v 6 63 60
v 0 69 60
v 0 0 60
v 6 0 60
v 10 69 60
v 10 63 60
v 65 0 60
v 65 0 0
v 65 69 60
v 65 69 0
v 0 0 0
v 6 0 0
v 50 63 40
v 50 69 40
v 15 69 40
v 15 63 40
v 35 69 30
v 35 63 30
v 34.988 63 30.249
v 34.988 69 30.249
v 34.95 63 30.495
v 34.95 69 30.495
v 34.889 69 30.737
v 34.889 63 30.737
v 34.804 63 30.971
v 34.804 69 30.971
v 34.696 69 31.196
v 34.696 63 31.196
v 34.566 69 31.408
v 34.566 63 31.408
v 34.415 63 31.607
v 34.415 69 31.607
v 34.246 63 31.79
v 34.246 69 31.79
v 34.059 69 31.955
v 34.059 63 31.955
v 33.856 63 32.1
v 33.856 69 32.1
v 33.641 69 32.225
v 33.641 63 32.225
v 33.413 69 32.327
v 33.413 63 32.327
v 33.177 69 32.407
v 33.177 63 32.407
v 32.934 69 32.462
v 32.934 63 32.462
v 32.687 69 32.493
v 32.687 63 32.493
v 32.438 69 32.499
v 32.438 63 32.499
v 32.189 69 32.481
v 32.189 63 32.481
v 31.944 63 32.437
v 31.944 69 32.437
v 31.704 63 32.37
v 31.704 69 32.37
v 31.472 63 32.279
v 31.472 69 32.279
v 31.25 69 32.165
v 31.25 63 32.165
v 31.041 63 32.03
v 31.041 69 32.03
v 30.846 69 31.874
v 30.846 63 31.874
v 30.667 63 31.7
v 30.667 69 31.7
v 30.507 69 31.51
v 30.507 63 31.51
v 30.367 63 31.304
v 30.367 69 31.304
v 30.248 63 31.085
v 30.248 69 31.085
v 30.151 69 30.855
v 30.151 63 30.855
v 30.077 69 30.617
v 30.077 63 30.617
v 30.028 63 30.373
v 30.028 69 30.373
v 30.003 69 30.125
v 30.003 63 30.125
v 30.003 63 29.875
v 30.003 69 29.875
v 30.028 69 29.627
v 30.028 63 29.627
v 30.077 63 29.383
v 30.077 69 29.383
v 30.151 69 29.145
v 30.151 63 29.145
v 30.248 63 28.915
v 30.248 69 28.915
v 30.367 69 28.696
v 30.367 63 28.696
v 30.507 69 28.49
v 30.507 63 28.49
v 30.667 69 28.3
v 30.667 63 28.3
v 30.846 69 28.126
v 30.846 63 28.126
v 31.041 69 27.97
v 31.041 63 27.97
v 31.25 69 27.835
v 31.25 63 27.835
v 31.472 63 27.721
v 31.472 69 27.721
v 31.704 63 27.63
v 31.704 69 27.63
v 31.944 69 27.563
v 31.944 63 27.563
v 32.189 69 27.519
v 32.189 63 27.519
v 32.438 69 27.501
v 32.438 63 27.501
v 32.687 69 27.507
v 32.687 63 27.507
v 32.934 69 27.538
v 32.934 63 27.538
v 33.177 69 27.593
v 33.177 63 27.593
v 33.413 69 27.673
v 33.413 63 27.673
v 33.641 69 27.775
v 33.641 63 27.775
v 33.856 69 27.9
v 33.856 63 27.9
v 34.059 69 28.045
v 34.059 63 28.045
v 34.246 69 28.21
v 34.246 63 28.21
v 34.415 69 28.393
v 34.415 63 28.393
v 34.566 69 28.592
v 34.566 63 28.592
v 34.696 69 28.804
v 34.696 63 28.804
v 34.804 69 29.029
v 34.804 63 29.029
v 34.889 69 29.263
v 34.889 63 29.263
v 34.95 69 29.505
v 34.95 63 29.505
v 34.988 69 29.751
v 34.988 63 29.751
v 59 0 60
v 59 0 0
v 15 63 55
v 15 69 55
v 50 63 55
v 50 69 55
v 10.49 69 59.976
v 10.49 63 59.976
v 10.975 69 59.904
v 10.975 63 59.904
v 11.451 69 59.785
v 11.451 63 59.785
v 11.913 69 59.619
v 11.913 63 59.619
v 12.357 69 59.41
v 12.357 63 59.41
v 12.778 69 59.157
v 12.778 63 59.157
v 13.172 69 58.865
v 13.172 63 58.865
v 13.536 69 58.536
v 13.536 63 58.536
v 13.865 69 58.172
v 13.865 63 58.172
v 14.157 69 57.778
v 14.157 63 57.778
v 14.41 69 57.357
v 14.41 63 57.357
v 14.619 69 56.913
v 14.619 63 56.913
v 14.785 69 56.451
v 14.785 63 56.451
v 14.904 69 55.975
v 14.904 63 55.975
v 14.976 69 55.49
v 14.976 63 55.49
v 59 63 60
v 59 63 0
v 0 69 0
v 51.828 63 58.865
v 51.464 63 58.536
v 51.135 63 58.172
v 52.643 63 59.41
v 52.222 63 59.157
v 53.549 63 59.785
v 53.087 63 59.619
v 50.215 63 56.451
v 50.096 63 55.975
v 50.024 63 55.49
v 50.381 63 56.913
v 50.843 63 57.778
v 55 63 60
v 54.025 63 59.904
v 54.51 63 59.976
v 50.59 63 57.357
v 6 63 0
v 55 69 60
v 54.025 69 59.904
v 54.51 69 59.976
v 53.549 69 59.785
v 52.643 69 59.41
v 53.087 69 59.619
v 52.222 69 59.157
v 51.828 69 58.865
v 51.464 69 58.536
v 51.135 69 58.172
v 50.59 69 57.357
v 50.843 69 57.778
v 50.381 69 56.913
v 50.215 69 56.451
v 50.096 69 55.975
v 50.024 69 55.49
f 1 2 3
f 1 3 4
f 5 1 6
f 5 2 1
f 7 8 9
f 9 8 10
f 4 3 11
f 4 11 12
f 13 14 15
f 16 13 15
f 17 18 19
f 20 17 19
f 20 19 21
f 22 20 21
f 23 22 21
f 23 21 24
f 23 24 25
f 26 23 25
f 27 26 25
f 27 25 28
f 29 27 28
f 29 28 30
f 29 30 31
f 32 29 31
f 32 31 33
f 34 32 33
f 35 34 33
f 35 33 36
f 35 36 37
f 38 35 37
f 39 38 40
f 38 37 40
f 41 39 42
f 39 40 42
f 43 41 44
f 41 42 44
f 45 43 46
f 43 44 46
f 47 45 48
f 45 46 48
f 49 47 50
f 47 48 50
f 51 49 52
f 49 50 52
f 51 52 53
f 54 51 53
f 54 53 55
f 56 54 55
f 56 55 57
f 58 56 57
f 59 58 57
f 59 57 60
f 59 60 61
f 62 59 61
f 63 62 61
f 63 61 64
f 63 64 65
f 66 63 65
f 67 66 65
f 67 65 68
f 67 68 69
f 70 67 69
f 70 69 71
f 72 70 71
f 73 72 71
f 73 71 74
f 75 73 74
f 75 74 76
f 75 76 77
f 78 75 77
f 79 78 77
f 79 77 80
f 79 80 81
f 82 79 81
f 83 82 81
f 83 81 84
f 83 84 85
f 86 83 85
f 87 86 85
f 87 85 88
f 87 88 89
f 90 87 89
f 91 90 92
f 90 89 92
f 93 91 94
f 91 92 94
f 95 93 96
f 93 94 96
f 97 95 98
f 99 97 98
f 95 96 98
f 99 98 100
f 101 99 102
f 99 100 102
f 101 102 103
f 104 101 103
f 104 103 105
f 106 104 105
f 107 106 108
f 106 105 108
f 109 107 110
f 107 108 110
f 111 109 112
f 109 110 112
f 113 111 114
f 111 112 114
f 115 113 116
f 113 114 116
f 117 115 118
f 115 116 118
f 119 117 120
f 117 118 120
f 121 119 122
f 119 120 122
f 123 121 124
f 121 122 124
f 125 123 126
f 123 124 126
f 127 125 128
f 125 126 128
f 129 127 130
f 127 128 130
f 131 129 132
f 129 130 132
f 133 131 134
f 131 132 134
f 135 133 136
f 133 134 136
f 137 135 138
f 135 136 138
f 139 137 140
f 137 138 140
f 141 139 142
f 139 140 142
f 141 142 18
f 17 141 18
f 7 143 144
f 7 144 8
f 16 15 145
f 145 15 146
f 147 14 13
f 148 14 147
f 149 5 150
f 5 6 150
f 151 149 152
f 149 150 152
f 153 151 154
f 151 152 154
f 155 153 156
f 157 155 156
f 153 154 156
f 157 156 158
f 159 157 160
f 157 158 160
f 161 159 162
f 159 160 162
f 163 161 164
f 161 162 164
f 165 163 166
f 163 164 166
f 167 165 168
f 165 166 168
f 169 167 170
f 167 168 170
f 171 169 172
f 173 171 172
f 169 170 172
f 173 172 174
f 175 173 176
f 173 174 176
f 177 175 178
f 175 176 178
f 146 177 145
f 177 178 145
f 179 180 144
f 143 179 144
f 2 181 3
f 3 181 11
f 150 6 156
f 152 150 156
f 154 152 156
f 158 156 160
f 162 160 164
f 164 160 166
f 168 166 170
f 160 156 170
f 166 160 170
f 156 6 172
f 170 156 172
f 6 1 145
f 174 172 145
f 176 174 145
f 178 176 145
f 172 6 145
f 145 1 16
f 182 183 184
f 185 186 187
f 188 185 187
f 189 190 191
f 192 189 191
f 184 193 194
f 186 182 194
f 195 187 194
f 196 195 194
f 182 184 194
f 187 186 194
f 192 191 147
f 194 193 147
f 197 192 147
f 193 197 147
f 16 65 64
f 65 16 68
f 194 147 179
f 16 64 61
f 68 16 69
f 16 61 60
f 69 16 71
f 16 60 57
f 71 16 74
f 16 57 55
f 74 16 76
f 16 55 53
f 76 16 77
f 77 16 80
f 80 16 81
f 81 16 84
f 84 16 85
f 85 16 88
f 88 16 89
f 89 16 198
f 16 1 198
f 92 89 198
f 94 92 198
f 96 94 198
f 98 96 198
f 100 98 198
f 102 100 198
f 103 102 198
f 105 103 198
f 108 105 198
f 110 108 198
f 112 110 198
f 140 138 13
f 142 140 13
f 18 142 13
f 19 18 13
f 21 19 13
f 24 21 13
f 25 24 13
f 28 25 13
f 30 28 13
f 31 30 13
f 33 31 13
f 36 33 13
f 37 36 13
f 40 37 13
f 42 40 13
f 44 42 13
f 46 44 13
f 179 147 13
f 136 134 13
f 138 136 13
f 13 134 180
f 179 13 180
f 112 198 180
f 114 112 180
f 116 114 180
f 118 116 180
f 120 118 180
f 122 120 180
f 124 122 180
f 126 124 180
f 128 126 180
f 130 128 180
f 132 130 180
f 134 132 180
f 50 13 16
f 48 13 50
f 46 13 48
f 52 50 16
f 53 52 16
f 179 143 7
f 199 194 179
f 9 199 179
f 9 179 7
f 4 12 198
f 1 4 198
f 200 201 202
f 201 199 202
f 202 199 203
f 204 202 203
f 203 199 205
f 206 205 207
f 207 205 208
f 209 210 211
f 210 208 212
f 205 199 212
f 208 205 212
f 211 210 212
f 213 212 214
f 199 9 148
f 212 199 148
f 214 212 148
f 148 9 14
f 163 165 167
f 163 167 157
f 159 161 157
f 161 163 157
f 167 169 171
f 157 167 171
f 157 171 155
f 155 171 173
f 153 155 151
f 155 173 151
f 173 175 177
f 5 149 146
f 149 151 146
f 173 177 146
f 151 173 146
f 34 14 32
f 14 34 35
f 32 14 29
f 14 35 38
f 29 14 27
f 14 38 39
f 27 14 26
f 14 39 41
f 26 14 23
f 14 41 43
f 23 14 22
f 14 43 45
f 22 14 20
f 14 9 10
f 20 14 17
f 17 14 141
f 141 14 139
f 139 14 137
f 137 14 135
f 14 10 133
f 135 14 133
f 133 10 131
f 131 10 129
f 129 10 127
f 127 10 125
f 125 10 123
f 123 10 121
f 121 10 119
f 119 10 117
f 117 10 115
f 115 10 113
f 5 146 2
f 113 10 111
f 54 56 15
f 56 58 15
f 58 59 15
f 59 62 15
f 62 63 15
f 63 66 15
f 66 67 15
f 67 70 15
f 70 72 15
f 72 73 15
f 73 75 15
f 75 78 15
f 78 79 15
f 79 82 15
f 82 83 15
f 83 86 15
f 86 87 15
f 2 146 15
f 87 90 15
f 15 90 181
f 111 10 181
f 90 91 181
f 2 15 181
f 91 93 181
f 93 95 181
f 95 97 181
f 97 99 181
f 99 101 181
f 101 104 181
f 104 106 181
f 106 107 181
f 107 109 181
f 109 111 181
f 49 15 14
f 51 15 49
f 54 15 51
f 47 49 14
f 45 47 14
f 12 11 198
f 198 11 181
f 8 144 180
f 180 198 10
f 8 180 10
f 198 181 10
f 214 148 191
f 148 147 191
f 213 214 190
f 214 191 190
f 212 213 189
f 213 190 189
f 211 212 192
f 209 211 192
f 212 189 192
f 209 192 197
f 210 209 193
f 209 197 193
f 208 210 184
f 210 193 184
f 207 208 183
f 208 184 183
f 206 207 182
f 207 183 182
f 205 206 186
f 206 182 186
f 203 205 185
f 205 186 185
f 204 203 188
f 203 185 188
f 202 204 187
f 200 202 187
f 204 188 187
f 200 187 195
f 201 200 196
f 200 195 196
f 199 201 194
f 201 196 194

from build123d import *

# Parameters (mm, degrees)
F1_DEPTH = 60
F3_D     = 5
F4_W     = 35
F4_H     = 20
F5_DEPTH = 25
F6_R     = 5


with BuildPart() as f1:
    # F0 (on Top) → F1 (new body)
    with BuildSketch(Plane.XY):
        Polygon((0, 69), (0, 0), (6, 0), (6, 63), (59, 63), (59, 0), (65, 0), (65, 69), align=None)
    extrude(amount=F1_DEPTH)

    # F3 (through all)
    with Locations(Plane(origin=(0, 69, 0), x_dir=(-1, 0, 0), z_dir=(0, 1, 0))):
        with Locations((-32.5, 30)):
            Hole(F3_D / 2)

    # F4 (on face) → F5 (cut)
    with BuildSketch(Plane(origin=(0, 69, 0), x_dir=(-1, 0, 0), z_dir=(0, 1, 0))):
        with Locations((-32.5, 50)):
            Rectangle(F4_W, F4_H)
    extrude(amount=-F5_DEPTH, mode=Mode.SUBTRACT)

    # F6
    f6_edges = [f1.edges().sort_by_distance(p)[0] for p in [
        (15, 66, 60),
        (50, 66, 60),
    ]]
    fillet(f6_edges, radius=F6_R)


solid = f1.part
